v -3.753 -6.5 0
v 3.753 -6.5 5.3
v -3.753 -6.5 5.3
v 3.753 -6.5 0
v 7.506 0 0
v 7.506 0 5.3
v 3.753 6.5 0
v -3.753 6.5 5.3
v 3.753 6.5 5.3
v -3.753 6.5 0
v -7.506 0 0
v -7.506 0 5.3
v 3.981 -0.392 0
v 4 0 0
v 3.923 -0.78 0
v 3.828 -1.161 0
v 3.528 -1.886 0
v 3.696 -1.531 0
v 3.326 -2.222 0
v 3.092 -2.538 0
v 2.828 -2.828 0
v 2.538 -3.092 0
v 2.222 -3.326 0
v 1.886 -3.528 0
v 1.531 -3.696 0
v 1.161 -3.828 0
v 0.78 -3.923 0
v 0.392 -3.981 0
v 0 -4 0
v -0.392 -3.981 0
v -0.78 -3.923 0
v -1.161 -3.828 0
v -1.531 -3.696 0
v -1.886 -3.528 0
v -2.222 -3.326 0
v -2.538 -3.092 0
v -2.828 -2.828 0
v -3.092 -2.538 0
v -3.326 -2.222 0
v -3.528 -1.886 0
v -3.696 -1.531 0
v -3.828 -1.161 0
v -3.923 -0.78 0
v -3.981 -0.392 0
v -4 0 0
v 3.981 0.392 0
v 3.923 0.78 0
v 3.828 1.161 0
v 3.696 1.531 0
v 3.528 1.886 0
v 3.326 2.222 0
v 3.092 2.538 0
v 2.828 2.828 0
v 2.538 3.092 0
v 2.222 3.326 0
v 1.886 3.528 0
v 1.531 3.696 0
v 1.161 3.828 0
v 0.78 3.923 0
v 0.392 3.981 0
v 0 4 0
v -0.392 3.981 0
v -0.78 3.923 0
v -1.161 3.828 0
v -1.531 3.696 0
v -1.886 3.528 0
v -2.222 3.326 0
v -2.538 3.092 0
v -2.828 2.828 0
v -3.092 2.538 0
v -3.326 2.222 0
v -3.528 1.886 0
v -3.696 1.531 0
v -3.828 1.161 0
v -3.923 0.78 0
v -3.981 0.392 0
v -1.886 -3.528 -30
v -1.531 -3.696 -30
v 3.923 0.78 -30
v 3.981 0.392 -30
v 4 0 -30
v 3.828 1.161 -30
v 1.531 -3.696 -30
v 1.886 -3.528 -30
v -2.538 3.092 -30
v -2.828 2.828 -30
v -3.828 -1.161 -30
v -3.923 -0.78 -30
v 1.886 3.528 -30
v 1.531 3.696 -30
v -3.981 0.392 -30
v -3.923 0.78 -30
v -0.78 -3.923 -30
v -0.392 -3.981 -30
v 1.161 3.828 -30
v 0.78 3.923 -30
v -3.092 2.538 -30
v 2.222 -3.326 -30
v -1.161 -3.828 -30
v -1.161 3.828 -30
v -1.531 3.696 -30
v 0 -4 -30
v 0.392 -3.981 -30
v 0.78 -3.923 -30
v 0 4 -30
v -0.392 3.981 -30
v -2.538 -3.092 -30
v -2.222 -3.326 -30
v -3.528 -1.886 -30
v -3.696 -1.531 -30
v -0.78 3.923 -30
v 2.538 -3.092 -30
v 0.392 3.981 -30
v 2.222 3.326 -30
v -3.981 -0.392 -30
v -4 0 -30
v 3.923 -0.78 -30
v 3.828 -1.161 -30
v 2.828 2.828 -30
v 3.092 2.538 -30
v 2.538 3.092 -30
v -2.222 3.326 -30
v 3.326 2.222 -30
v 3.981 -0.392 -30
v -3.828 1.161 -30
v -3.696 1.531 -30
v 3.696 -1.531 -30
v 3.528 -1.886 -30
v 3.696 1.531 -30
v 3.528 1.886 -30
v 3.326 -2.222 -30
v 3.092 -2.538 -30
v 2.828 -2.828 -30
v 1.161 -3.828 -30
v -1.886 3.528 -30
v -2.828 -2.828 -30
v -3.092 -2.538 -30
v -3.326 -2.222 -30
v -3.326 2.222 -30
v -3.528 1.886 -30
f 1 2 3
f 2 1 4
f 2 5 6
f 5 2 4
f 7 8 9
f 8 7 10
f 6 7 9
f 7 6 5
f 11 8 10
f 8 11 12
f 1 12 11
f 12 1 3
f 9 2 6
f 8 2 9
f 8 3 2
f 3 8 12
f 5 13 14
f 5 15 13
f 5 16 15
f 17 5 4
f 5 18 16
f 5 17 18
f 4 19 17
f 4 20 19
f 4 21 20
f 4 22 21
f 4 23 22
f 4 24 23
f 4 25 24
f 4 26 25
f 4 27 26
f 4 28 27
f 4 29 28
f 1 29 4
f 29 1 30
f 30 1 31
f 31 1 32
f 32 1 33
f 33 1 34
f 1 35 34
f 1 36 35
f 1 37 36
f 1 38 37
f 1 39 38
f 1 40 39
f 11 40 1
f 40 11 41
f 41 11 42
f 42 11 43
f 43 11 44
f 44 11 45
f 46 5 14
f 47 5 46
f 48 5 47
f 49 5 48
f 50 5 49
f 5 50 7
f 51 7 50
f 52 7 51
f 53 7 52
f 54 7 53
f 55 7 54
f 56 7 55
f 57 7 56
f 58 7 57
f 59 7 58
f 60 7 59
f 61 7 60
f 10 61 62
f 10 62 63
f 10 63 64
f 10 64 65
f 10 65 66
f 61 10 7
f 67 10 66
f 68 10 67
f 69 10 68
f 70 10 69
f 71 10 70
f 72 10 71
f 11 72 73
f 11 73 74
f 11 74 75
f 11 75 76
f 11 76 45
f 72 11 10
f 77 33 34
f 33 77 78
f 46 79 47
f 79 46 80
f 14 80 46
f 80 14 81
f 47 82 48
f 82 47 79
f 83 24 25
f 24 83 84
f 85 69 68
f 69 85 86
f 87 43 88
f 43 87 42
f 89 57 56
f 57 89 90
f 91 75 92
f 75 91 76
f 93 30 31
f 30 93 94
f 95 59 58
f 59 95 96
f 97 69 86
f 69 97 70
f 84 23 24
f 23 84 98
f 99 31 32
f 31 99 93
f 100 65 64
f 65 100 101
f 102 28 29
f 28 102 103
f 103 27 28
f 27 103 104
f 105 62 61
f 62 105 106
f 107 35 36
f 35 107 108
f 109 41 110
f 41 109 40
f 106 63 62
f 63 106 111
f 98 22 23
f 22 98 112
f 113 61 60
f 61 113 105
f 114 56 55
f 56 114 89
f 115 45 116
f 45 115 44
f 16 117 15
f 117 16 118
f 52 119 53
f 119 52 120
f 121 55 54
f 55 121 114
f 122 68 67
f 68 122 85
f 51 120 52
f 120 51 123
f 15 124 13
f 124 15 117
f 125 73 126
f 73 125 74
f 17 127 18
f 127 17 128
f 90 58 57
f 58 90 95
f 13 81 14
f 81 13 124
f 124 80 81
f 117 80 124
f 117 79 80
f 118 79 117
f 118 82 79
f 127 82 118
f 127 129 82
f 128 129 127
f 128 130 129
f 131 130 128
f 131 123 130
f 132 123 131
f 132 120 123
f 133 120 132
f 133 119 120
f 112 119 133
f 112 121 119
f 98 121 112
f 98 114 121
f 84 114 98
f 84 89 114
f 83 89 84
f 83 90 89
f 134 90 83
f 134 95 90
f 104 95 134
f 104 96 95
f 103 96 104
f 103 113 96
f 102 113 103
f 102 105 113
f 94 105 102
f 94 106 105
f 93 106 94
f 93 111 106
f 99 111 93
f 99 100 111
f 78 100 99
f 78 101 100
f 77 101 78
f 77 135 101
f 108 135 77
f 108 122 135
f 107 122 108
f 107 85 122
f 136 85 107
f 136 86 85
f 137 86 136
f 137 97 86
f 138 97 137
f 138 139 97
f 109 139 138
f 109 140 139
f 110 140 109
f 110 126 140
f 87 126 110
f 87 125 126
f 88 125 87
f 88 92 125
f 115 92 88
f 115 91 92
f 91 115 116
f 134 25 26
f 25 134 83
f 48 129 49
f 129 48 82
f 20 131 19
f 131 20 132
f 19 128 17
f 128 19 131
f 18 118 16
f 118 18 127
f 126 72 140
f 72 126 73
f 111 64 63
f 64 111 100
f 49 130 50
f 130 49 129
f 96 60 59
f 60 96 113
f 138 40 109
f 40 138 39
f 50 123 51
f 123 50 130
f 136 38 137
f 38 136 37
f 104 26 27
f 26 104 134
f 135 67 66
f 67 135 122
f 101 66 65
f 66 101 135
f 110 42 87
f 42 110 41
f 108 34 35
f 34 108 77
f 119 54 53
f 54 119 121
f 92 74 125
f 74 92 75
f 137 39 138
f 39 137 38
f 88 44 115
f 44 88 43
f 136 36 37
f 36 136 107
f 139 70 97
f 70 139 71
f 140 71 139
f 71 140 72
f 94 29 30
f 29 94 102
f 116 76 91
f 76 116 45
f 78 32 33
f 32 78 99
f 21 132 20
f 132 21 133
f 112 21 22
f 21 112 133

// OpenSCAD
// M8 hex bolt (ISO 4014 style, thread simplified as plain cylinder)

// ---- Parameters ----
head_af     = 13;    // across-flats width [mm]
head_height = 5.3;   // head height [mm]
shank_dia   = 8;     // shank diameter [mm]
shank_len   = 30;    // shank length [mm]
$fn         = 64;

// ---- Model ----
m8_hex_bolt();

module m8_hex_bolt() {
    // Head: hexagonal prism, bottom face at z = 0, extending to +Z
    hex_head(head_af, head_height);

    // Shank: cylinder extending to -Z from z = 0
    translate([0, 0, -shank_len])
        cylinder(h = shank_len, d = shank_dia);
}

module hex_head(across_flats, h) {
    // circumscribed circle diameter from across-flats distance
    cylinder(h = h, d = across_flats / cos(180 / 6), $fn = 6);
}
